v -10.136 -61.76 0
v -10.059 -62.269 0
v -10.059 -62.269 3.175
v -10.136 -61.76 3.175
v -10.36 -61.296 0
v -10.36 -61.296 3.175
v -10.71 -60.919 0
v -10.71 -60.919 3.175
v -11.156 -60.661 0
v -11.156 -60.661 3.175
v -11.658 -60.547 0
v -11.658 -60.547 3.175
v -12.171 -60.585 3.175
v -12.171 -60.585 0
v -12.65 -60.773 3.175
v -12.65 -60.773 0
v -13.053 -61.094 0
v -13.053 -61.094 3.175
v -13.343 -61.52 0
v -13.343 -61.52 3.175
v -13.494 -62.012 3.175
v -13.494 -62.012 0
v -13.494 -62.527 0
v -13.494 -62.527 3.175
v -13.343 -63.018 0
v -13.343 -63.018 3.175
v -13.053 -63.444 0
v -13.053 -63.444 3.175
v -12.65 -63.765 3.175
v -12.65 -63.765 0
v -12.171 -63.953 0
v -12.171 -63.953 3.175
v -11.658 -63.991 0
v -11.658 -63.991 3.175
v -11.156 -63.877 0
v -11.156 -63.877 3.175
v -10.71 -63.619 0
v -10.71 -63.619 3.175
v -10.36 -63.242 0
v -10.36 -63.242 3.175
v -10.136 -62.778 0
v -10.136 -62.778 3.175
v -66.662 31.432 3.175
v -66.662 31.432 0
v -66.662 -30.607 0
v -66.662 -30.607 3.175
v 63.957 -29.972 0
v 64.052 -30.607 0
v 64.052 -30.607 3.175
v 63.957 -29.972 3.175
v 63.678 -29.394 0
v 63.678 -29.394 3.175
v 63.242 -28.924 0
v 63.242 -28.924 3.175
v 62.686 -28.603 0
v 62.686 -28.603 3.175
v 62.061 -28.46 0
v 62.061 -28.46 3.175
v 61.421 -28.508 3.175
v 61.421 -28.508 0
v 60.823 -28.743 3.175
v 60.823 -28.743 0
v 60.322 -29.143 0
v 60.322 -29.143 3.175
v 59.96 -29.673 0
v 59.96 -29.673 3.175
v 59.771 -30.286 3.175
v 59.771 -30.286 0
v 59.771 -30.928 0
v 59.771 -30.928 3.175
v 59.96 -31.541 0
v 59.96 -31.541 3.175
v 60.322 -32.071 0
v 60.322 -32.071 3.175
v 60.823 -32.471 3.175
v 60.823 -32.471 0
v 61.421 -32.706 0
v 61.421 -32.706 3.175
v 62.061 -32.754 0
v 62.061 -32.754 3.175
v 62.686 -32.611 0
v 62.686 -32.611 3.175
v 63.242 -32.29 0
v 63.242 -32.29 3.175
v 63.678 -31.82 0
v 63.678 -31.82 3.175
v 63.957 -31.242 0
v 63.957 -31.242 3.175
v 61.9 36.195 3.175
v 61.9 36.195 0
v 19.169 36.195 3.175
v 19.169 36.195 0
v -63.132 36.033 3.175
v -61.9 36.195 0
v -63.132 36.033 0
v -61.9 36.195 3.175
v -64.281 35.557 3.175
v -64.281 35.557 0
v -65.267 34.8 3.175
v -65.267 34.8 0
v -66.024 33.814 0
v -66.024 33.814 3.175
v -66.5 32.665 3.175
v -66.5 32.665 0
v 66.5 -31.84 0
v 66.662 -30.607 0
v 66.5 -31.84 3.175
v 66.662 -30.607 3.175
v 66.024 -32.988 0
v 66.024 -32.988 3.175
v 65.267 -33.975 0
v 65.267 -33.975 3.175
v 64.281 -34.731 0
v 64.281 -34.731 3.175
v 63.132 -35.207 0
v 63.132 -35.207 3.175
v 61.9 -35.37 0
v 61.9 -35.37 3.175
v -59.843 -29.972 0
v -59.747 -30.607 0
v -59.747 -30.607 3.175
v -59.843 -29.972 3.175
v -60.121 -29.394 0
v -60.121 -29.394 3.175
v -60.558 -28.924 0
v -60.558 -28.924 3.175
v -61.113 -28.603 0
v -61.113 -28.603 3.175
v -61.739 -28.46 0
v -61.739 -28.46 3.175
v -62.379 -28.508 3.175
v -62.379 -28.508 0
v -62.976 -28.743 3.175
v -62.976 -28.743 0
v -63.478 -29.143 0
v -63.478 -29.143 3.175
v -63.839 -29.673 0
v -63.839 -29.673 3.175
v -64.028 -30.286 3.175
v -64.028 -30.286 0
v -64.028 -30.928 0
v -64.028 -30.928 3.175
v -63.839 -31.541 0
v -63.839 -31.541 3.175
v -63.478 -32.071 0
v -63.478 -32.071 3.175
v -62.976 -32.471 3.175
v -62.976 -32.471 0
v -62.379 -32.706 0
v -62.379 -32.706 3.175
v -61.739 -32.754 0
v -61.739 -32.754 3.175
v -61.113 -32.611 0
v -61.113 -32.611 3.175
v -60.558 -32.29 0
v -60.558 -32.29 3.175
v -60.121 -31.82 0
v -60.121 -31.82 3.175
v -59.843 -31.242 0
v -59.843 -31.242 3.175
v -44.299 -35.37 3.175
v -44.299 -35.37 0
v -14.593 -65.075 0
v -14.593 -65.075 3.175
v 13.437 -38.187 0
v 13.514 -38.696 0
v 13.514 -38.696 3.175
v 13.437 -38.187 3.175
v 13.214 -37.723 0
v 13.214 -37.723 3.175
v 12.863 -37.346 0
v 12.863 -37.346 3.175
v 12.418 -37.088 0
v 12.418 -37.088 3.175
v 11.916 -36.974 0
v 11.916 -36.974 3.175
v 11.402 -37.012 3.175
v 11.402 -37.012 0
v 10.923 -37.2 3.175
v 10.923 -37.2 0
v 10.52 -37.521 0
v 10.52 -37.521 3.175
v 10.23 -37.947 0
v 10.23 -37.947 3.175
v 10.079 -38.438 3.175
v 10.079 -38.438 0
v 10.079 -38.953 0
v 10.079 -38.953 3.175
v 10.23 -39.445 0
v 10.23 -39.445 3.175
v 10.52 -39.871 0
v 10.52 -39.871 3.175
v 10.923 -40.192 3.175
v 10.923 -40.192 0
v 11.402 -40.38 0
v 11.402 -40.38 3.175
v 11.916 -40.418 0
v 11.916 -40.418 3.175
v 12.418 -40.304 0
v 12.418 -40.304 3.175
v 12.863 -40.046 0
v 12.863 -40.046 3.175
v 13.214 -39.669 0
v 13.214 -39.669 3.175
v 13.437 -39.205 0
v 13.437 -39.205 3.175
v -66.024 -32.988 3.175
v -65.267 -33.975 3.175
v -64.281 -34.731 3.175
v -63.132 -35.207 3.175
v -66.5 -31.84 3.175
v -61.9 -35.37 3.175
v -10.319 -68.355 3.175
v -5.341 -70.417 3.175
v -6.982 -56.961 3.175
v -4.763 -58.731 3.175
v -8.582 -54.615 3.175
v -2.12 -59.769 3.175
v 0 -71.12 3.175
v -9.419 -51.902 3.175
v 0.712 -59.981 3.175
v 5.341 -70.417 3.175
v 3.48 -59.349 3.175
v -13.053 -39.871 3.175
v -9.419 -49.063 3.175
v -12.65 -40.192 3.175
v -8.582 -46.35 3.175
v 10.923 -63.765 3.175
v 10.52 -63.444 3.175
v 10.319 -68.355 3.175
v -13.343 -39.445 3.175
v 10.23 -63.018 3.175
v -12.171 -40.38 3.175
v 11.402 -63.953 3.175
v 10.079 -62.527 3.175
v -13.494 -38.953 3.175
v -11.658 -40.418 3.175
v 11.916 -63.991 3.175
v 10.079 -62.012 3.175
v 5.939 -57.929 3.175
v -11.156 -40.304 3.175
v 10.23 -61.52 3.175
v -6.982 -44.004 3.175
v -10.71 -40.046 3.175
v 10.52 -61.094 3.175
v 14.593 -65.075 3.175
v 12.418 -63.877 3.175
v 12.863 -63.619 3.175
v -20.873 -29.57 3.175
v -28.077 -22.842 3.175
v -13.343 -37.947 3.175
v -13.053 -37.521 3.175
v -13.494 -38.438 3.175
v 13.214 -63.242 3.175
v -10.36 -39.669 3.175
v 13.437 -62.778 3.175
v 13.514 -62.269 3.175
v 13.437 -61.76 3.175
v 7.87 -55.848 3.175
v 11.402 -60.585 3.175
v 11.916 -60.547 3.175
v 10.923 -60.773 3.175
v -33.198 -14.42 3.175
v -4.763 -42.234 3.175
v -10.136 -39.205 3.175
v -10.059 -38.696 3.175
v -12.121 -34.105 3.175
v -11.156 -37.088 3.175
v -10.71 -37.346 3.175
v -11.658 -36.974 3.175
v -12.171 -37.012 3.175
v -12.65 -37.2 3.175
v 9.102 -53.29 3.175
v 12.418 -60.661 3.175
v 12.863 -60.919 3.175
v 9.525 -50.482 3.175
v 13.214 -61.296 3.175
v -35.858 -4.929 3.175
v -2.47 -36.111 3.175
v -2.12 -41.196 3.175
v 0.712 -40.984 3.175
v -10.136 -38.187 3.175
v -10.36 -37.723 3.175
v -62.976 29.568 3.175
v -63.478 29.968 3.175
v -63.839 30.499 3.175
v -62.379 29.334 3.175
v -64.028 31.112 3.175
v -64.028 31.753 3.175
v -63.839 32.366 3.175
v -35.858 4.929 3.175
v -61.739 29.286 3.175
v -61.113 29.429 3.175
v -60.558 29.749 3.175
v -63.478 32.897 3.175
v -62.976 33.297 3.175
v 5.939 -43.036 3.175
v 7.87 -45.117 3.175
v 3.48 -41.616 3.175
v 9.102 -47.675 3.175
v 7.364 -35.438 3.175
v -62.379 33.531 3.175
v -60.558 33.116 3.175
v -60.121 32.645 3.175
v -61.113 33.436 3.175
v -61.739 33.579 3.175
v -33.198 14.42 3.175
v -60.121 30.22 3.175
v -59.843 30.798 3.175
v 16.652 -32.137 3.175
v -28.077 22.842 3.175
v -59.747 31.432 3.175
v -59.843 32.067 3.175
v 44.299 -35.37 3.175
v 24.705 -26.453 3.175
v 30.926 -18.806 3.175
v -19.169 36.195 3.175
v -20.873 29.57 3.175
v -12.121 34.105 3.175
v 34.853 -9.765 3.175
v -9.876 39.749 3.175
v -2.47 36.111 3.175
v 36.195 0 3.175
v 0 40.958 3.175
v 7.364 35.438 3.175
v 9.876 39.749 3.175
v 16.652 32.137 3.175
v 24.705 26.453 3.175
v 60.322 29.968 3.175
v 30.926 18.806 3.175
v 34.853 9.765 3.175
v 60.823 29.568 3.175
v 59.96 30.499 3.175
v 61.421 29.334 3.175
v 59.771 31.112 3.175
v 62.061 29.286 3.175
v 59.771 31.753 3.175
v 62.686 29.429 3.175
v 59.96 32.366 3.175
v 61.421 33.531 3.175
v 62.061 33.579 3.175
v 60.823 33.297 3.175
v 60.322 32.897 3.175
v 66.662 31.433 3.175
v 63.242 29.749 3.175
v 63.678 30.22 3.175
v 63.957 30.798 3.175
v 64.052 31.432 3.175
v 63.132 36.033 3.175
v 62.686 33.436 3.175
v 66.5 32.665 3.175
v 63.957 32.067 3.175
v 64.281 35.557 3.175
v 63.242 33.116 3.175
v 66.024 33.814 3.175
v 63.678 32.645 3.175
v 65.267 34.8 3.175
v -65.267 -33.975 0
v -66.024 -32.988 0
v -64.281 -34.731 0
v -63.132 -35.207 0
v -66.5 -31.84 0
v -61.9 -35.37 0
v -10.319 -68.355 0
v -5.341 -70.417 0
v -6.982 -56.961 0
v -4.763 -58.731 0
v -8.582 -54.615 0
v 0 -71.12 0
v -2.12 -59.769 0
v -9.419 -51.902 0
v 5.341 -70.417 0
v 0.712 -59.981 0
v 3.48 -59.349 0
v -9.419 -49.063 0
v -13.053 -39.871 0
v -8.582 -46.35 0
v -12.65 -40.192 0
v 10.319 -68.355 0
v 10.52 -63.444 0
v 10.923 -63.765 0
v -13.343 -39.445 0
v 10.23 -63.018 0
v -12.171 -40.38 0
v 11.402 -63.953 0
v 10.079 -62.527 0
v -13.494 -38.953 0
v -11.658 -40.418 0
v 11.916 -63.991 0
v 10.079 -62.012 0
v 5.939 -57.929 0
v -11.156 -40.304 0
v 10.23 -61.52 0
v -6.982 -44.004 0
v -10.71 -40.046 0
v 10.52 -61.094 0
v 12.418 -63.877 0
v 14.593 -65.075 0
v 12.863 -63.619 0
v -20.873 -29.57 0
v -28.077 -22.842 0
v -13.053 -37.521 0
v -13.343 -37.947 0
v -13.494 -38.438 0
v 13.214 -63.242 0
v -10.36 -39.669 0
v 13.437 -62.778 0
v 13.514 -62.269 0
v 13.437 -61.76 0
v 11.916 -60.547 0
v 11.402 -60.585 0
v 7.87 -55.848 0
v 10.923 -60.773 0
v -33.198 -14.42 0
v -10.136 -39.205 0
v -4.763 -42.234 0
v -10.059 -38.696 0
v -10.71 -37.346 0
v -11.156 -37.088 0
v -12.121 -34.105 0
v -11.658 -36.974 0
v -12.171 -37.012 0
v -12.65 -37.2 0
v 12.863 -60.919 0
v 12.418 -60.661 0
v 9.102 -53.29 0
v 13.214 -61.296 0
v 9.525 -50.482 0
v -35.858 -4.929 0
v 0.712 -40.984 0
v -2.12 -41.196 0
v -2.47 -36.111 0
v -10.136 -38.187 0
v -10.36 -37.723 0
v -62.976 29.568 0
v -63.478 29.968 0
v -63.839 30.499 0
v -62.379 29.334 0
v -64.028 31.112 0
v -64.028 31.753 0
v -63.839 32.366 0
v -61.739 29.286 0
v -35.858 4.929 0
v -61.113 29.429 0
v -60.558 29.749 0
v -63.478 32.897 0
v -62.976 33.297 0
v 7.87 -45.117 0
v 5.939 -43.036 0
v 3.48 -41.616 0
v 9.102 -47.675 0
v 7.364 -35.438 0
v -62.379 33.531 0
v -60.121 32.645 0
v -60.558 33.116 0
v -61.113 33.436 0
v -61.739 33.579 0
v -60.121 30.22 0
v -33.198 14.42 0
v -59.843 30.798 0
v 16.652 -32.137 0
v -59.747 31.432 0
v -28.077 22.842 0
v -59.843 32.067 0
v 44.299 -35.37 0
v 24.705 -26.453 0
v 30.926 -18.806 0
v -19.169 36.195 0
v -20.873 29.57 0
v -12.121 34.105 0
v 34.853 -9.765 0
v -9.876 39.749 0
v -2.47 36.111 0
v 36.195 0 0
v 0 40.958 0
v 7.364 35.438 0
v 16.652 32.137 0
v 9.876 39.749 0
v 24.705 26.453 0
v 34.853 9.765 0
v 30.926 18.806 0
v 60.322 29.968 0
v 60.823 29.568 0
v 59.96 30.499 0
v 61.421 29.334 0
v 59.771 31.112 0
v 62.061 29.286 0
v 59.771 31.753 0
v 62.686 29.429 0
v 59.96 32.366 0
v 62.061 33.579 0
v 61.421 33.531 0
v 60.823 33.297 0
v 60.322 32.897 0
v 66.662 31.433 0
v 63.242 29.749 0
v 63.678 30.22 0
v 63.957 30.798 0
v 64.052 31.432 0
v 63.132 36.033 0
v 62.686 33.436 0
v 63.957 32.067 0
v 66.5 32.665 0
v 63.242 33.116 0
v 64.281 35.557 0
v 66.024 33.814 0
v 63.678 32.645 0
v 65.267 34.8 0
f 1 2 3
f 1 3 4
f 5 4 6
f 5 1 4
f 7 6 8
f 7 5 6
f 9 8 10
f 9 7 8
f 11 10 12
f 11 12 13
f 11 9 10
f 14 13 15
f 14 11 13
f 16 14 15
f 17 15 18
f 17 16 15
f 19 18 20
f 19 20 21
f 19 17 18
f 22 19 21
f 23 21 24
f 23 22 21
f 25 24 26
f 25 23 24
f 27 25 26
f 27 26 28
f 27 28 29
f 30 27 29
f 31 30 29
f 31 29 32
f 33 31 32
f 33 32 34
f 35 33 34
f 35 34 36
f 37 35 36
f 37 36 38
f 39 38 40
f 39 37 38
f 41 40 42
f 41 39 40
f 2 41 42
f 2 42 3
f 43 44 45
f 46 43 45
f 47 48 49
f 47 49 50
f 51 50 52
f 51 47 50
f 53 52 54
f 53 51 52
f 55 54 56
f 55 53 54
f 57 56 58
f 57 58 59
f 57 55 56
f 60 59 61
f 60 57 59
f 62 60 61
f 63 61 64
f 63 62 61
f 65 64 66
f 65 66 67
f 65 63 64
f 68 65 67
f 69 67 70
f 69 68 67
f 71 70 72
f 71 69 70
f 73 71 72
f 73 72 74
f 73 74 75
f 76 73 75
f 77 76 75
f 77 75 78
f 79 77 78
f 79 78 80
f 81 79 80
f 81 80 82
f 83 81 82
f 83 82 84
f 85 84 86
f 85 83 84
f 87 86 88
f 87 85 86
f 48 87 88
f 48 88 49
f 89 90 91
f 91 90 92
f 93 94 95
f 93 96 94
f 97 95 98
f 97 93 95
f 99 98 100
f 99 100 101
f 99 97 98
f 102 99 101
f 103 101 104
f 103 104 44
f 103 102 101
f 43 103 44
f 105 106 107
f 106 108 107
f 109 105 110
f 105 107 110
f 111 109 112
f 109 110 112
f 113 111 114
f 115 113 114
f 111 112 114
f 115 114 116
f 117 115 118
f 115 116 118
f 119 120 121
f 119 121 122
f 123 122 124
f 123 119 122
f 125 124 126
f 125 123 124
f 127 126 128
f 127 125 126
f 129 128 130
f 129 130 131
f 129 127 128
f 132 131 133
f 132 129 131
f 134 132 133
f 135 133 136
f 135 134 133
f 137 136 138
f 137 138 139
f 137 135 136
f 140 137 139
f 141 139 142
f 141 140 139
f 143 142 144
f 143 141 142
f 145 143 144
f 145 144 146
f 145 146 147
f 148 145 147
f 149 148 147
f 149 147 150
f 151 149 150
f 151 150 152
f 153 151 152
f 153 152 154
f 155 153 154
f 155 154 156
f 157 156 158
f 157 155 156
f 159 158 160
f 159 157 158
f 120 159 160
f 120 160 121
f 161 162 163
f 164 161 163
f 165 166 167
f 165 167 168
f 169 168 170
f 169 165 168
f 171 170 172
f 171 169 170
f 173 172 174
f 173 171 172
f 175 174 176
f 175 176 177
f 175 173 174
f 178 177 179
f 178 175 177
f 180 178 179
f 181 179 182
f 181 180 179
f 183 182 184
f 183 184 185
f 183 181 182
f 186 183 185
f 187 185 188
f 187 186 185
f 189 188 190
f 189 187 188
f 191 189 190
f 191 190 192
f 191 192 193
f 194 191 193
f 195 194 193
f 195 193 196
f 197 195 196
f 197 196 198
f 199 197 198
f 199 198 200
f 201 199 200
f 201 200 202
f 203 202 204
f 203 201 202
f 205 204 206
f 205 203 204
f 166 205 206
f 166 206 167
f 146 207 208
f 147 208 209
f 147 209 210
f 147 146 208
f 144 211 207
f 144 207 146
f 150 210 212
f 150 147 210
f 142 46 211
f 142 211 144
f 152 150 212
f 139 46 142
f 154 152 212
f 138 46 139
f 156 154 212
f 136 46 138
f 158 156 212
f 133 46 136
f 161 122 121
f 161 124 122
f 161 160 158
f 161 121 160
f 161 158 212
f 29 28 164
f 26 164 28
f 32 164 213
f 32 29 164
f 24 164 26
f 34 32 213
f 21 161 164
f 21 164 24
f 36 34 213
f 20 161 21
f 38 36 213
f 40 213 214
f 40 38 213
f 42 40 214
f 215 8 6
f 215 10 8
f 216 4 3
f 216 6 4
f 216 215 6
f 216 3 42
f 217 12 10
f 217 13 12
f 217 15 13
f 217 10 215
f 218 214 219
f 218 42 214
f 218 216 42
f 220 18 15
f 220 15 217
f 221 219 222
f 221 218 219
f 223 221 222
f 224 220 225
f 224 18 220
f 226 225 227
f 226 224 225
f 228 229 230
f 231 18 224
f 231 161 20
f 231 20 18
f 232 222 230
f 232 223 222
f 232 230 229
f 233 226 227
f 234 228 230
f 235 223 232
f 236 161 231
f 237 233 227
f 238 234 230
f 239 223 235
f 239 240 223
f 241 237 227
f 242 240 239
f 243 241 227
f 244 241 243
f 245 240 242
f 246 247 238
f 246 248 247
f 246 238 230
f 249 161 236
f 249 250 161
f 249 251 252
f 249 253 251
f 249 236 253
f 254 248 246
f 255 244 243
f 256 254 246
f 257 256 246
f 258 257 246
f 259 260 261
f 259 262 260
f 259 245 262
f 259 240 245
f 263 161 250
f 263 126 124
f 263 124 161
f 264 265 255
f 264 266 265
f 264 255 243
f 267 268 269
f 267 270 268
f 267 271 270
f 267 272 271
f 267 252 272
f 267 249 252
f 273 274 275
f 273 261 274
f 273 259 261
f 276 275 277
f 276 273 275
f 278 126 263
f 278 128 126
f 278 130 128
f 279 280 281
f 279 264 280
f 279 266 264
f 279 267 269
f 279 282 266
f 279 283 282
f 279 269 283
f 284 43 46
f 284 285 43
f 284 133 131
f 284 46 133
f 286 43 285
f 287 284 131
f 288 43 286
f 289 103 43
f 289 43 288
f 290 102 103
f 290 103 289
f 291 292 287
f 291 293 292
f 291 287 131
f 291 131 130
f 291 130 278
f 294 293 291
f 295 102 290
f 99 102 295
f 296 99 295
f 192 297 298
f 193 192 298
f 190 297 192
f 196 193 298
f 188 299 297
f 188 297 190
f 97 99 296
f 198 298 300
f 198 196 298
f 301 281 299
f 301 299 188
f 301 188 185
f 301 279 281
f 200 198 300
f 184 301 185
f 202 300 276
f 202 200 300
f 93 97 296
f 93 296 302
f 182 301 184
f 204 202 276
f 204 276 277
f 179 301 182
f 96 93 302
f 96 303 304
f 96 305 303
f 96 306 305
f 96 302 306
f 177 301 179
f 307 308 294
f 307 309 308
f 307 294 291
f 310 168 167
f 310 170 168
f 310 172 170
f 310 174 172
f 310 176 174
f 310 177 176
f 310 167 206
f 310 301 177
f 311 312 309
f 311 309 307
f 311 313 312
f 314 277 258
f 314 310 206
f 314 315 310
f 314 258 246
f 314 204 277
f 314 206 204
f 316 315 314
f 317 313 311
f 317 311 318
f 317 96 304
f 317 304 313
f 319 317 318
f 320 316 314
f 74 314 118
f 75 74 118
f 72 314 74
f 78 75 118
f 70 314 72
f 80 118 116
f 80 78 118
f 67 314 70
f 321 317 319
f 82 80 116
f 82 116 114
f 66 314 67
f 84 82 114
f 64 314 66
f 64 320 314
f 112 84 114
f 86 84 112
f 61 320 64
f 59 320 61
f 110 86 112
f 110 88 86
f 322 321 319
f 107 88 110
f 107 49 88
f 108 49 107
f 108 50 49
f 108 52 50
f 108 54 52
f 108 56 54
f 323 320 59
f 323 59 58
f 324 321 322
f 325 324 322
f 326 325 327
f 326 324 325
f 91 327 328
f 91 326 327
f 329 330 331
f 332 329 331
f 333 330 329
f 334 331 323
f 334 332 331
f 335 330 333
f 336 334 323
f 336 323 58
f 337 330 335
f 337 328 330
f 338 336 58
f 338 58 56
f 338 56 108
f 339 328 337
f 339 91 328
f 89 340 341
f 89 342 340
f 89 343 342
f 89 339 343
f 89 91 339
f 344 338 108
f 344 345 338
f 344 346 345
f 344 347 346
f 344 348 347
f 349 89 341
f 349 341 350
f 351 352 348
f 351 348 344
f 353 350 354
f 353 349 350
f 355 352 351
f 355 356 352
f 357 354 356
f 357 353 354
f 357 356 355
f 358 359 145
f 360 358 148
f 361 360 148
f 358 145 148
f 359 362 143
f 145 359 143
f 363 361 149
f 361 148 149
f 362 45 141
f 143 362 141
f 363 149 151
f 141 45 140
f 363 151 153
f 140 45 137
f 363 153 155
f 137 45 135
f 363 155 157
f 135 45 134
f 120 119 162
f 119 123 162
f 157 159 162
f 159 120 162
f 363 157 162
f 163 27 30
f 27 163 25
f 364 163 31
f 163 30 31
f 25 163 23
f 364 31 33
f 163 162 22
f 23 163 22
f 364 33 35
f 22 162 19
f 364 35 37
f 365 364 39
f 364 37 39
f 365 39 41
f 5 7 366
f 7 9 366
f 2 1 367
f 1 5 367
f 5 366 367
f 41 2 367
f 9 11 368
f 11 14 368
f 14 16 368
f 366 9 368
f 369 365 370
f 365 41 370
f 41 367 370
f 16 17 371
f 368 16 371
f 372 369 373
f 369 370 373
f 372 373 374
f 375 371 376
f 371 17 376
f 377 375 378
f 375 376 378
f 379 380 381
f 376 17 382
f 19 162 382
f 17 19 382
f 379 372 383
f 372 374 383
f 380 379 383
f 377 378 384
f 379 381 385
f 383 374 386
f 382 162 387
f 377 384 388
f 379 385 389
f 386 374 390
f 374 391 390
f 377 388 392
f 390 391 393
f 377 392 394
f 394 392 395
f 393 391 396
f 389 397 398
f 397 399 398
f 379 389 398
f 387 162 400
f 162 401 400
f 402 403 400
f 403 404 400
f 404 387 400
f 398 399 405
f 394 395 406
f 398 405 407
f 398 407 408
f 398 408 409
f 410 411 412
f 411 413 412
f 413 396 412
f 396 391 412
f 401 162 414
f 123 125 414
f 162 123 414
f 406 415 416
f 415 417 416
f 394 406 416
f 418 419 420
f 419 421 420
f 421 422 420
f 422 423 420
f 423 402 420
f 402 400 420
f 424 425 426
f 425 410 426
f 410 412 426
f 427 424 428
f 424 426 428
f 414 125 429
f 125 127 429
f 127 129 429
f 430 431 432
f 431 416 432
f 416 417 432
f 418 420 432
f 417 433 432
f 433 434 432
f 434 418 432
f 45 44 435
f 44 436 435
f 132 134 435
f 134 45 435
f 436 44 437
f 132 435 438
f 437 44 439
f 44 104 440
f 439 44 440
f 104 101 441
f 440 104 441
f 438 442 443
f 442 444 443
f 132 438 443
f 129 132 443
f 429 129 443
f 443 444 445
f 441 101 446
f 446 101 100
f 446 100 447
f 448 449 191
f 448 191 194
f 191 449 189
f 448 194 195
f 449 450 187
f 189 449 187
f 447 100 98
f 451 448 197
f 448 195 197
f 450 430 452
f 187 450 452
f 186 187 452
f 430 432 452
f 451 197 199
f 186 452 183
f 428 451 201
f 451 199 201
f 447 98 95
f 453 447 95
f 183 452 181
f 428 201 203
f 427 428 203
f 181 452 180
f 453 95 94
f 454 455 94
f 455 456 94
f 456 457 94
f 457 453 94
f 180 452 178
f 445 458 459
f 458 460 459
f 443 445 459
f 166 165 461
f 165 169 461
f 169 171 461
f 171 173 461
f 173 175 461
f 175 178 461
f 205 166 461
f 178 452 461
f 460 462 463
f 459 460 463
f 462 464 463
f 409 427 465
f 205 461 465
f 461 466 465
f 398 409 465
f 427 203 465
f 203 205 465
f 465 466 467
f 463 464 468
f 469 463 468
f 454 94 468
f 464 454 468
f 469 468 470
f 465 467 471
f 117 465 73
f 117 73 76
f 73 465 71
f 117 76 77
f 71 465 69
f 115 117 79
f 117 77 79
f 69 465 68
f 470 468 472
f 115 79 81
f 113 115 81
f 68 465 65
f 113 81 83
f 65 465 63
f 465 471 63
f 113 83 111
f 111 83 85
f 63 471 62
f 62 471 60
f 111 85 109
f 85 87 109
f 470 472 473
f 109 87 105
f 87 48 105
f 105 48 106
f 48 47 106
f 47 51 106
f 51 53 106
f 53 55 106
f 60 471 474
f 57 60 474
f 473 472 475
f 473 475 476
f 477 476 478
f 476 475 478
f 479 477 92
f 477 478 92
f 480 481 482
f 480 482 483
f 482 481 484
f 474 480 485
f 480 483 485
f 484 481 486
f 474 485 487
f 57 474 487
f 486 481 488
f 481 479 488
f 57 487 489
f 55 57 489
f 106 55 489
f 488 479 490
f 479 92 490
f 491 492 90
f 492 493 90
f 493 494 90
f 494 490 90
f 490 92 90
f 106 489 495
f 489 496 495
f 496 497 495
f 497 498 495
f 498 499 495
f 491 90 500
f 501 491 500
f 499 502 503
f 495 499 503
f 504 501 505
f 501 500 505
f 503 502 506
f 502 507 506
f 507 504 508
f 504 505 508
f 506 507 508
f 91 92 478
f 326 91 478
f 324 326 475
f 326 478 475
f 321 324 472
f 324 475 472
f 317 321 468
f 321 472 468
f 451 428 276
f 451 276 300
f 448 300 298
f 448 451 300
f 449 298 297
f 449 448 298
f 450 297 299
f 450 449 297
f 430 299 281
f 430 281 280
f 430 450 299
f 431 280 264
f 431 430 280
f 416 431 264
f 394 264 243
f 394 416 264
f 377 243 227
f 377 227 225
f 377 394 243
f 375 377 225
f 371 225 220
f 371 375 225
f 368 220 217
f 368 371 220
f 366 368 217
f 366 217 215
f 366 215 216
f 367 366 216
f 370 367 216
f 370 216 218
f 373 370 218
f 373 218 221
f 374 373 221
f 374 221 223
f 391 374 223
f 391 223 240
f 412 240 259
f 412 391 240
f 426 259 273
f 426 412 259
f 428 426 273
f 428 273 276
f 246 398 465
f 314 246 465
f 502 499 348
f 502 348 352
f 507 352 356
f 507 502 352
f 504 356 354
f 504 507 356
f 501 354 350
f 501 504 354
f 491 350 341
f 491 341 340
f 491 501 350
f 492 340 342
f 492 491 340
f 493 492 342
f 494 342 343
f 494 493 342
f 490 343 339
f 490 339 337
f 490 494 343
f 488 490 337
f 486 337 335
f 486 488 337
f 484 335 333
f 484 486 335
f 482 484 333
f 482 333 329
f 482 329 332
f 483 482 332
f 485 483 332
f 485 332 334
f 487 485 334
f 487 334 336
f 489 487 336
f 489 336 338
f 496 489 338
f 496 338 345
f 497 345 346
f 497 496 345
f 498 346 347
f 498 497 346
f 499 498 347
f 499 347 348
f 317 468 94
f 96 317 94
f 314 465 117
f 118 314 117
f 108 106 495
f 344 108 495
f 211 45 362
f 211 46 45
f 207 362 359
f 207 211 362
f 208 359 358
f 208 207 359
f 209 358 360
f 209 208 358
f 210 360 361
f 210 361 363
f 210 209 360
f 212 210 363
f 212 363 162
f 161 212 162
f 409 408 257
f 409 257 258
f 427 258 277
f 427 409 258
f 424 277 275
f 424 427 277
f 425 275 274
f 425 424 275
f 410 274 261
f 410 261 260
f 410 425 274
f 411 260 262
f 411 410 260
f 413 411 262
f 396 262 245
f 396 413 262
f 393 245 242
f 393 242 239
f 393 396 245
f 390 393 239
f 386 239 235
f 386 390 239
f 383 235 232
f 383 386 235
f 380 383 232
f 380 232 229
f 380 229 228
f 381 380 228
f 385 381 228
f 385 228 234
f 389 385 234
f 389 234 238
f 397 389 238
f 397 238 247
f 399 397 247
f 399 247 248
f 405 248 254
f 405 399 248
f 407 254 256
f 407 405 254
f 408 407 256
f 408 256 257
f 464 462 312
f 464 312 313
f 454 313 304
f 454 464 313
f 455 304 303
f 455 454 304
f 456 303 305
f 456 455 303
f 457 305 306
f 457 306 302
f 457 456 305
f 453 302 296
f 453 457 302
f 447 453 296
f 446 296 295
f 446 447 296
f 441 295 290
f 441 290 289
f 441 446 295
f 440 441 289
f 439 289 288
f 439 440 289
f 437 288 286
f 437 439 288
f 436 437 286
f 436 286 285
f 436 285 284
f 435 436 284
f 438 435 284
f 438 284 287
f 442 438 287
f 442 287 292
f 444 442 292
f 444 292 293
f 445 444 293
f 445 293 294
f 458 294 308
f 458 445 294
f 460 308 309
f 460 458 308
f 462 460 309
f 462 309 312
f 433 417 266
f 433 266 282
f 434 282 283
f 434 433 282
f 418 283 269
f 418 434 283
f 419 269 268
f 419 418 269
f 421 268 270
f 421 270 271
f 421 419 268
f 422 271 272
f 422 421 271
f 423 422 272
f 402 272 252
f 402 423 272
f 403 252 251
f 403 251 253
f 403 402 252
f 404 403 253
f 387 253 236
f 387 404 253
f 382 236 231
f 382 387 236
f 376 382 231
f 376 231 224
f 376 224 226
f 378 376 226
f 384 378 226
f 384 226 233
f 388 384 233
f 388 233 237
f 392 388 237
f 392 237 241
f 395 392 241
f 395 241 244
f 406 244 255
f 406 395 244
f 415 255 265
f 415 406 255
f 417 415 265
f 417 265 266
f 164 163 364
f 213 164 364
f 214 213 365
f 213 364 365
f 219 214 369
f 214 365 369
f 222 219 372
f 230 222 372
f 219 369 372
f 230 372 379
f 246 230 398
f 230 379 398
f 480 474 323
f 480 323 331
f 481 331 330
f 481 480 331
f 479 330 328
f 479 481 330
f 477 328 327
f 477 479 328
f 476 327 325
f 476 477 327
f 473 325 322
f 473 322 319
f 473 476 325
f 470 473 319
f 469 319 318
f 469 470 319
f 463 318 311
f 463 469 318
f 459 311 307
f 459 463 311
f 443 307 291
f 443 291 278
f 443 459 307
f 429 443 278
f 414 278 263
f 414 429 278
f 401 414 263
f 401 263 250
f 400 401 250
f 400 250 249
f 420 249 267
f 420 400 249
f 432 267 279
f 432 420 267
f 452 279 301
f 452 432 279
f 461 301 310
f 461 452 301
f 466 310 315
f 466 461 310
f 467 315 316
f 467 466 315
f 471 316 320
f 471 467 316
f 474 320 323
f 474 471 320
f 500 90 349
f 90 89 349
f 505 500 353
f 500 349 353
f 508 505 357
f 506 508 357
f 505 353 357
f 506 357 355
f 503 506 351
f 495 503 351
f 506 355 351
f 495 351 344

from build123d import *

# Parameters (mm, degrees)
F0_R     = 1.7272
F0_R_2   = 2.15265
F0_R_3   = 9.525
F0_R_4   = 36.195
F1_DEPTH = 3.175
F2_R     = 4.7625


with BuildPart() as f1:
    # F0 (on Top) → F1 (new body)
    with BuildSketch(Plane.XY):
        with BuildLine():
            Line((-19.1686927371, 36.195), (-66.6623, 36.195))
            Line((-66.6623, 36.195), (-66.6623, -35.3695))
            Line((-66.6623, -35.3695), (-44.2988323935, -35.3695))
            Line((-44.2988323935, -35.3695), (-14.5929161967, -65.0754161967))
            ThreePointArc((-14.5929161967, -65.0754161967), (0, -71.12), (14.5929161967, -65.0754161967))
            Line((14.5929161967, -65.0754161967), (44.2988323935, -35.3695))
            Line((44.2988323935, -35.3695), (66.6623, -35.3695))
            Line((66.6623, -35.3695), (66.6623, 36.195))
            Line((66.6623, 36.195), (19.1686927371, 36.195))
            ThreePointArc((19.1686927371, 36.195), (0, 40.9575), (-19.1686927371, 36.195))
        make_face()
        with Locations((-11.7865861589, -62.2690861589)):
            Circle(F0_R, mode=Mode.SUBTRACT)
        with Locations((-61.8998, -30.607)):
            Circle(F0_R_2, mode=Mode.SUBTRACT)
        with Locations((-11.7865861589, -38.6959138411)):
            Circle(F0_R, mode=Mode.SUBTRACT)
        with Locations((11.7865861589, -62.2690861589)):
            Circle(F0_R, mode=Mode.SUBTRACT)
        with Locations((0, -50.4825)):
            Circle(F0_R_3, mode=Mode.SUBTRACT)
        with Locations((11.7865861589, -38.6959138411)):
            Circle(F0_R, mode=Mode.SUBTRACT)
        with Locations((61.8998, -30.607)):
            Circle(F0_R_2, mode=Mode.SUBTRACT)
        with Locations((-61.8998, 31.4325)):
            Circle(F0_R_2, mode=Mode.SUBTRACT)
        Circle(F0_R_4, mode=Mode.SUBTRACT)
        with Locations((61.8998, 31.4325)):
            Circle(F0_R_2, mode=Mode.SUBTRACT)
    extrude(amount=F1_DEPTH)

    # F2
    f2_edges = [f1.edges().sort_by_distance(p)[0] for p in [
        (66.6623, -35.3695, 1.5875),
        (-66.6623, -35.3695, 1.5875),
        (66.6623, 36.195, 1.5875),
        (-66.6623, 36.195, 1.5875),
    ]]
    fillet(f2_edges, radius=F2_R)


solid = f1.part
